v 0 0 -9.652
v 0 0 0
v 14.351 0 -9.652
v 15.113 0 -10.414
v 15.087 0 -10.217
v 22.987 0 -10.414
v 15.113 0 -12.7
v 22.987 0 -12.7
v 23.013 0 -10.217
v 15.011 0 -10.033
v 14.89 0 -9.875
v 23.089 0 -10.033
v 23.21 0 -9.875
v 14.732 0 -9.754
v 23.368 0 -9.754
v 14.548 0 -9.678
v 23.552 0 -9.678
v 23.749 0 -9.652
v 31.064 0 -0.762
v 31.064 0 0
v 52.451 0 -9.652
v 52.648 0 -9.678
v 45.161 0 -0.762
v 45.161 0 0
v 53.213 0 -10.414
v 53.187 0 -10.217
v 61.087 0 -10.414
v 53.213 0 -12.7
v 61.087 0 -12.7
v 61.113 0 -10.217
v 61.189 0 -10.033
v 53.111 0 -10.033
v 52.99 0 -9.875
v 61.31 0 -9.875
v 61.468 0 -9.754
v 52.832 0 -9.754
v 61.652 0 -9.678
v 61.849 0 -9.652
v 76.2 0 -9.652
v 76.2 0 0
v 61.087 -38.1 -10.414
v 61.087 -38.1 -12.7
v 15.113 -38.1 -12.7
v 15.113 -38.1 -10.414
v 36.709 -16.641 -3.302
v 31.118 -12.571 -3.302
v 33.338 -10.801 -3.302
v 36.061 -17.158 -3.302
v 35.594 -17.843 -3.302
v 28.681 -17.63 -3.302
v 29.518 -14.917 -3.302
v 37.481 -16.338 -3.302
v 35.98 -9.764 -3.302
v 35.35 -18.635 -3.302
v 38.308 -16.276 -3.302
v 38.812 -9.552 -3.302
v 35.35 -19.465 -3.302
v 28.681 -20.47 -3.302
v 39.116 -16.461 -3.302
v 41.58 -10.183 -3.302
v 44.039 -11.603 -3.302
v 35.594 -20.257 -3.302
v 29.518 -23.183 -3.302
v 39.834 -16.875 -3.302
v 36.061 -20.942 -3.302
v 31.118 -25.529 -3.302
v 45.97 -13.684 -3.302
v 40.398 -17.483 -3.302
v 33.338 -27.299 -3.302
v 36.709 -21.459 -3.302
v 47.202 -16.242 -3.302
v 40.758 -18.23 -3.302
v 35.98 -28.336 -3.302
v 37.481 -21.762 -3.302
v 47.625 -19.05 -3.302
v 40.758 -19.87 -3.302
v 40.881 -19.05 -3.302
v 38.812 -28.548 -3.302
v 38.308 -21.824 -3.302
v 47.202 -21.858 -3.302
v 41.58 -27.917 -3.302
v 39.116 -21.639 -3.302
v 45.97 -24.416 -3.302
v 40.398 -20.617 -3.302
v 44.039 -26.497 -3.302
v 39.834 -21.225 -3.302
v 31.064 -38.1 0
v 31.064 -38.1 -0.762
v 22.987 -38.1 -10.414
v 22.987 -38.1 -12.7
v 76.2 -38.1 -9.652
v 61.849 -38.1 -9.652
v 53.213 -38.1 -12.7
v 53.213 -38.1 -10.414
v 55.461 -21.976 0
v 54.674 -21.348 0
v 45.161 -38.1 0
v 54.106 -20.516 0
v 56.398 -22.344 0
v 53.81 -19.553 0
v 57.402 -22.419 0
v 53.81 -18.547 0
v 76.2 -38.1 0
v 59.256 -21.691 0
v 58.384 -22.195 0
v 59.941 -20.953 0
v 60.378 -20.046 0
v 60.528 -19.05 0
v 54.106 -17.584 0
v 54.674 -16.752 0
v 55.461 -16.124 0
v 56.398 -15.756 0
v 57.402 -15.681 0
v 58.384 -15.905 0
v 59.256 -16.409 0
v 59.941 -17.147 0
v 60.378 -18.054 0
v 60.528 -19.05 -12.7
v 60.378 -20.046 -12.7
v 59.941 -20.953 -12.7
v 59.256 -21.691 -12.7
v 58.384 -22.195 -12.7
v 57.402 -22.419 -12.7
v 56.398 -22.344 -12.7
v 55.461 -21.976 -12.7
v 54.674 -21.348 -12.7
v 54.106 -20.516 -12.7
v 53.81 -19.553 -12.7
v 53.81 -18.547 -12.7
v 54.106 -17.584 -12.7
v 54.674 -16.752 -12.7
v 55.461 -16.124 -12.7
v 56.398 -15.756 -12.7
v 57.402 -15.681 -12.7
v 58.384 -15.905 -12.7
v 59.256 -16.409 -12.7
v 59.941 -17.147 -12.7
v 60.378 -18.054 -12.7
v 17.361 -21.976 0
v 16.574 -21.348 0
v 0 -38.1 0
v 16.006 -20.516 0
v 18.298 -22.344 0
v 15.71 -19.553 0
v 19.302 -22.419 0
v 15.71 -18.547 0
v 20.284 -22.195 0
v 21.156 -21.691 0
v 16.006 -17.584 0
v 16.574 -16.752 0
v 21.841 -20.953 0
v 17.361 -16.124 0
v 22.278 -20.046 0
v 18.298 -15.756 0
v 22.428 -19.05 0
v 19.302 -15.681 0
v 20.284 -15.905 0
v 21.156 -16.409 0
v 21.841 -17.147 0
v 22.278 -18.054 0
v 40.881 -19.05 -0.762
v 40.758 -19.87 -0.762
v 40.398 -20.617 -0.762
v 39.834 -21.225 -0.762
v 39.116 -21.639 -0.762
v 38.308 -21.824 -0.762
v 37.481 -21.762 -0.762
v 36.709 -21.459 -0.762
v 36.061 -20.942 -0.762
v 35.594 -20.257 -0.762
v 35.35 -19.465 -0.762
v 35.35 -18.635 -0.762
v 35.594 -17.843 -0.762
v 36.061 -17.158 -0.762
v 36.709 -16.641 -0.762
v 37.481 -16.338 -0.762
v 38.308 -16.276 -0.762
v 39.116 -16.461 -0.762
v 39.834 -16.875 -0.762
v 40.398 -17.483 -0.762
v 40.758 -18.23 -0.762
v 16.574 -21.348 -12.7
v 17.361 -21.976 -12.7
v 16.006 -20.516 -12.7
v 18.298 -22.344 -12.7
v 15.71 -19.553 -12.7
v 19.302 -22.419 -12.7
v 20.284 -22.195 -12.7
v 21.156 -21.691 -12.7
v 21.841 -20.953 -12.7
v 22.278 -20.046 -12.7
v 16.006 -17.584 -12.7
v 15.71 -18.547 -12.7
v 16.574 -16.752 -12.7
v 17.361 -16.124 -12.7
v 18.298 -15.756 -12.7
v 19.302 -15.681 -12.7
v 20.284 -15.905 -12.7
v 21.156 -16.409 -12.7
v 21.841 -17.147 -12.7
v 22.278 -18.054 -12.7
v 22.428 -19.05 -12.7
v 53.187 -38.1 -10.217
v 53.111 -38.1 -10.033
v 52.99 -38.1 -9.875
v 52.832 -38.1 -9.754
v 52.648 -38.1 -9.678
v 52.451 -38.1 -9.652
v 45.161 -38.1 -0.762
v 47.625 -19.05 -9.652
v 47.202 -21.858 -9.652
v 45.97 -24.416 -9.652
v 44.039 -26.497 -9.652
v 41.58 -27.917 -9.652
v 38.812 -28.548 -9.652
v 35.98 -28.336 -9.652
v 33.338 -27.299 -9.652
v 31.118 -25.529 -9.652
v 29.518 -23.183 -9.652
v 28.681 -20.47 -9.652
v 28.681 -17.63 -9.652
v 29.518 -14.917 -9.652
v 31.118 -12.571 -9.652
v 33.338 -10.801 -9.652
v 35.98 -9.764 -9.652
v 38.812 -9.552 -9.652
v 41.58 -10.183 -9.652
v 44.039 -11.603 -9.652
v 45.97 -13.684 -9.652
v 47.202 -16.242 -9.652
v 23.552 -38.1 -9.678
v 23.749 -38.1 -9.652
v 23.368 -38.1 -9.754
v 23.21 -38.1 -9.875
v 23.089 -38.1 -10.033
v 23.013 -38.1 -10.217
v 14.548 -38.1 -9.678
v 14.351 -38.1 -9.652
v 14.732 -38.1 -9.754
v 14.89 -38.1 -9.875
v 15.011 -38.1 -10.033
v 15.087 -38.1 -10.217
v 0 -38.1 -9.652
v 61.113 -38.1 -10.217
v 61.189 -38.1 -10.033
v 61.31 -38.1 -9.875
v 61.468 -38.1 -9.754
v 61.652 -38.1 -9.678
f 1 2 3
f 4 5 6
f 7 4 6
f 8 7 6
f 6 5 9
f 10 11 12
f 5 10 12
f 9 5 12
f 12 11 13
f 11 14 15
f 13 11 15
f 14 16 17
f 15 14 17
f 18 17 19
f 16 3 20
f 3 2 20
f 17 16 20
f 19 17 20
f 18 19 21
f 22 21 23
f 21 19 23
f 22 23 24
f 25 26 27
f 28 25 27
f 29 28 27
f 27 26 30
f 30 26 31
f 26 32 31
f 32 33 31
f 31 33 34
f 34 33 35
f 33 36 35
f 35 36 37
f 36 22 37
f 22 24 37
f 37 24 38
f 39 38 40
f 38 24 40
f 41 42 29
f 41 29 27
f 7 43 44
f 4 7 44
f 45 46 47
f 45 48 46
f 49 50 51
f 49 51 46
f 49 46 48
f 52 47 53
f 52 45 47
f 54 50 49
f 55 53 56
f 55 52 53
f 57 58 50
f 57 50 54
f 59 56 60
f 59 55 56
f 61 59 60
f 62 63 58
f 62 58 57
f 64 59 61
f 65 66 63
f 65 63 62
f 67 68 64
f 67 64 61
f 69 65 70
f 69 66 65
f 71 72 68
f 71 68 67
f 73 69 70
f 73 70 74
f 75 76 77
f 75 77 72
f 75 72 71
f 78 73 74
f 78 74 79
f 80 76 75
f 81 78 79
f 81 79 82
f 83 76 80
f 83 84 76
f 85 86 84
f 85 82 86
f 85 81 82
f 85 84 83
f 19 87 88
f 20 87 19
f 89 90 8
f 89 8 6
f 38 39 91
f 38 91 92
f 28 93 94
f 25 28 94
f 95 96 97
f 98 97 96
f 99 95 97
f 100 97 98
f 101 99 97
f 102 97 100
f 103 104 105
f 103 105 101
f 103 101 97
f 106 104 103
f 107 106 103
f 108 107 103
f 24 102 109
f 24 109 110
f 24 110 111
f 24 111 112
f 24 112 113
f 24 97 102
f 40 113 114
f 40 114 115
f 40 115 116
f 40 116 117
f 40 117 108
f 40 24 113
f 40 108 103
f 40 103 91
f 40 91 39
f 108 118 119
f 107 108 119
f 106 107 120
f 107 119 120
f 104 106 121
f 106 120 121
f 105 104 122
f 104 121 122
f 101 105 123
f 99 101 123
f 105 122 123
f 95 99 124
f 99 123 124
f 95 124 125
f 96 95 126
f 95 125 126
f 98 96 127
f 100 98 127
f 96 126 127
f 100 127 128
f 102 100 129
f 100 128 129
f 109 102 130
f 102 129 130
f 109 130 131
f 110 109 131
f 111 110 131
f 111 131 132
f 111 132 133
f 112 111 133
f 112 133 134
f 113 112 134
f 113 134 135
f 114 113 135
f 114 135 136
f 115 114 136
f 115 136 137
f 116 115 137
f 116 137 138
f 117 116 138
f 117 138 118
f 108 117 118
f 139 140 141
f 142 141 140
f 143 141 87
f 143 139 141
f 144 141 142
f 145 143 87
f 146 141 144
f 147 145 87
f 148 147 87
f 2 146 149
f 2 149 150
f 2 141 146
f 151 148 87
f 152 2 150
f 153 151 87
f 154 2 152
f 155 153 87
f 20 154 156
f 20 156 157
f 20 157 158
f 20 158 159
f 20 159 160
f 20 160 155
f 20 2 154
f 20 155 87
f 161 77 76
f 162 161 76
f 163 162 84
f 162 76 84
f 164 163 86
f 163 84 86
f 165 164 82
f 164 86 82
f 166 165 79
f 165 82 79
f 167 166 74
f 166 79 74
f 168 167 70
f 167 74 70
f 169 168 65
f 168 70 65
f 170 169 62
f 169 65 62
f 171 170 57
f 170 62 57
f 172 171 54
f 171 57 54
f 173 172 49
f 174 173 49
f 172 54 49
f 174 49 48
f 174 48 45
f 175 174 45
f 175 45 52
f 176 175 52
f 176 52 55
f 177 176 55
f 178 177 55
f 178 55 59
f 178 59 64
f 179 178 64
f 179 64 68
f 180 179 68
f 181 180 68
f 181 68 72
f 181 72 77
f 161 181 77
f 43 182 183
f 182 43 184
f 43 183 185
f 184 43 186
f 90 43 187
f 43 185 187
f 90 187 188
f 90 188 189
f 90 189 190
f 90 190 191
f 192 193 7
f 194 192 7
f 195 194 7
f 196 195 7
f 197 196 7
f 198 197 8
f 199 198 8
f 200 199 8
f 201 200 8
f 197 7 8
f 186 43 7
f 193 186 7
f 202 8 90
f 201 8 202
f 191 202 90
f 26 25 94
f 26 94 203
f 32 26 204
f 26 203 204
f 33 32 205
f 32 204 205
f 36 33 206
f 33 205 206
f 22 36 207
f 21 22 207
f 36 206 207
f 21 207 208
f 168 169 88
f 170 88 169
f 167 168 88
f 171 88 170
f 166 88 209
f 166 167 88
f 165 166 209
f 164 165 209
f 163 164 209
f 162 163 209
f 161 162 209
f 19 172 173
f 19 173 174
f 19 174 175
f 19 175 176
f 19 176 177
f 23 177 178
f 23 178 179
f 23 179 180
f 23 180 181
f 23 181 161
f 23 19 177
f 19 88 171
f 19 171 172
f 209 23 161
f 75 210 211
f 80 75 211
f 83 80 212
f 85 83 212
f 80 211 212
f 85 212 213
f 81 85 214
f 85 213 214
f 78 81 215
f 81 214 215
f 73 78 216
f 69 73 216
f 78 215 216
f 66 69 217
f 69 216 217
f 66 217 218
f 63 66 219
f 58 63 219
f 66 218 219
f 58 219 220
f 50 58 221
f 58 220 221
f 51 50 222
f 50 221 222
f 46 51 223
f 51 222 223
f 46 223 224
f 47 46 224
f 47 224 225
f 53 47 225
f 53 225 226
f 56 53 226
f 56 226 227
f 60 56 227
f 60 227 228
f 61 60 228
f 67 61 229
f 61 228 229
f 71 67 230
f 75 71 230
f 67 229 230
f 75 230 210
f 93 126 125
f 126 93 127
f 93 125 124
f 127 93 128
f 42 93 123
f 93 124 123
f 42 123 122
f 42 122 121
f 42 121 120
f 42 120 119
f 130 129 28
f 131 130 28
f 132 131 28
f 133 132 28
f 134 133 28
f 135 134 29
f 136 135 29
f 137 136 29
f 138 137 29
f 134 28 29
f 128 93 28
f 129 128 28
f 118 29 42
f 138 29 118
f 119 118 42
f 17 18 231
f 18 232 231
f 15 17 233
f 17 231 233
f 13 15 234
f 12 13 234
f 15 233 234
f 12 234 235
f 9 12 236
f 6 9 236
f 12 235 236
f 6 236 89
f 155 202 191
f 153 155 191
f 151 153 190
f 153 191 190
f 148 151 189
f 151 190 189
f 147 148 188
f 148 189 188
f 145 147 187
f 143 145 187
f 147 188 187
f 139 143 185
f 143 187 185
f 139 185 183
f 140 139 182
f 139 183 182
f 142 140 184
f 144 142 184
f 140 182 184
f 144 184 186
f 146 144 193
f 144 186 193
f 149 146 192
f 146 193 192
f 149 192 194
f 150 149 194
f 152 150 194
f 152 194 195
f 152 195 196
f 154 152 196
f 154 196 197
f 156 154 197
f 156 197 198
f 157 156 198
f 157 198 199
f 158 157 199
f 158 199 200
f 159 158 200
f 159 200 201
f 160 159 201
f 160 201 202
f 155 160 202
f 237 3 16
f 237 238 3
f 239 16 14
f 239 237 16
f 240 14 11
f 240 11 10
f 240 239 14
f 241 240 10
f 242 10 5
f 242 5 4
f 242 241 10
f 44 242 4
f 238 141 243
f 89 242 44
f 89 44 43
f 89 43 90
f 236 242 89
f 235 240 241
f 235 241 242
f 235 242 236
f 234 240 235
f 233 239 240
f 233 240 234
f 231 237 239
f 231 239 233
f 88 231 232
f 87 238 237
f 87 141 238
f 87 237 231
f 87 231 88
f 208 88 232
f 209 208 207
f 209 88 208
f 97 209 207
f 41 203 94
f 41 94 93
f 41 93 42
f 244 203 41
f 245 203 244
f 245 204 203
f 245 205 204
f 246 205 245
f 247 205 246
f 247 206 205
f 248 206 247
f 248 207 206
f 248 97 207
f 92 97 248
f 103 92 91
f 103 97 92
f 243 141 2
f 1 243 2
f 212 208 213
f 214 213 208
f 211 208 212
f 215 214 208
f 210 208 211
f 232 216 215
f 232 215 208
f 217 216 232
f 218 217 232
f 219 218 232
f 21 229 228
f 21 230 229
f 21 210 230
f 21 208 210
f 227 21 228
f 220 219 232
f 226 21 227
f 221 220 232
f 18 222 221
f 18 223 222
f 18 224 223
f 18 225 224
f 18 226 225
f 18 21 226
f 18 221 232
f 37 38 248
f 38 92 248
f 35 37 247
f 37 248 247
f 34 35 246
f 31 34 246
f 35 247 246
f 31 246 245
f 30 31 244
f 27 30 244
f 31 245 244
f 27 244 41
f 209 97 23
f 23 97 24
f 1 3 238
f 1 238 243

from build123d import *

# Parameters (mm, degrees)
F0_W      = 76.2
F0_H      = 38.1
F1_DEPTH  = 12.7
F2_W      = 14.097
F2_H      = 38.1
F3_DEPTH  = 0.762
F4_W      = 15.113
F4_H      = 3.048
F4_W_2    = 30.226
F5_DEPTH  = 38.101
F6_R      = 9.525
F7_DEPTH  = 6.35
F8_R      = 2.7813
F9_DEPTH  = 3.303
F10_R     = 3.3782
F11_DEPTH = 12.701
F12_R     = 0.762


with BuildPart() as f1:
    # F0 (on Top) → F1 (new body)
    with BuildSketch(Plane.XY):
        with Locations((38.1, -19.05)):
            Rectangle(F0_W, F0_H)
    extrude(amount=-F1_DEPTH)

    # F2 (on face) → F3 (cut)
    with BuildSketch(Plane.XY):
        with Locations((38.1127, -19.05)):
            Rectangle(F2_W, F2_H)
    extrude(amount=-F3_DEPTH, mode=Mode.SUBTRACT)

    # F4 (on face) → F5 (cut, through all)
    with BuildSketch(Plane(origin=(0, 0, 0), x_dir=(-1, 0, 0), z_dir=(0, 1, 0))):
        with Locations((-68.6435, -11.176)):
            Rectangle(F4_W, F4_H)
        with Locations((-38.1, -11.176)):
            Rectangle(F4_W_2, F4_H)
        with Locations((-7.5565, -11.176)):
            Rectangle(F4_W, F4_H)
    extrude(amount=-F5_DEPTH, mode=Mode.SUBTRACT)

    # F6 (on face) → F7 (cut)
    with BuildSketch(Plane(origin=(0, 0, -9.652), x_dir=(1, 0, 0), z_dir=(0, 0, -1))):
        with Locations((38.1, 19.05)):
            Circle(F6_R)
    extrude(amount=-F7_DEPTH, mode=Mode.SUBTRACT)

    # F8 (on face) → F9 (cut, through all)
    with BuildSketch(Plane(origin=(0, 0, -3.302), x_dir=(1, 0, 0), z_dir=(0, 0, -1))):
        with Locations((38.1, 19.05)):
            Circle(F8_R)
    extrude(amount=-F9_DEPTH, mode=Mode.SUBTRACT)

    # F10 (on face) → F11 (cut, through all)
    with BuildSketch(Plane(origin=(0, 0, -12.7), x_dir=(1, 0, 0), z_dir=(0, 0, -1))):
        with Locations((19.05, 19.05)):
            Circle(F10_R)
        with Locations((57.15, 19.05)):
            Circle(F10_R)
    extrude(amount=-F11_DEPTH, mode=Mode.SUBTRACT)

    # F12
    f12_edges = [f1.edges().sort_by_distance(p)[0] for p in [
        (22.987, -19.05, -9.652),
        (53.213, -19.05, -9.652),
        (15.113, -19.05, -9.652),
        (61.087, -19.05, -9.652),
    ]]
    fillet(f12_edges, radius=F12_R)


solid = f1.part
